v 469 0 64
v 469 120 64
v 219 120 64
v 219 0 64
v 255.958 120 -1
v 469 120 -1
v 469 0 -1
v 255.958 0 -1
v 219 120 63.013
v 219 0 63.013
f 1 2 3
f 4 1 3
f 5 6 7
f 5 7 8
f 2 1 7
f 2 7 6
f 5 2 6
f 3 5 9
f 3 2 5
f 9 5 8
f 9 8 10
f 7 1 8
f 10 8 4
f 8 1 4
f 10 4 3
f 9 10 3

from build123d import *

# Parameters (mm, degrees)
BOX016_W               = 250
BOX016_H               = 120
BOX016_DEPTH           = 65
BOX016_PLACEMENT_ANGLE = 60
BOX017_W               = 250
BOX017_H               = 120
BOX017_DEPTH           = 65
CUT009_PLACEMENT_ANGLE = 180


with BuildPart() as box016:
    # Box016 → Box016 (new body)
    with BuildSketch(Plane.XY):
        with Locations((125, 60)):
            Rectangle(BOX016_W, BOX016_H)
    extrude(amount=BOX016_DEPTH)


with BuildPart() as box016_1:
    # Box016 placement: moved
    add(box016.part.moved(Location((187.927513, 0, 108.5))).rotate(Axis((187.927513, 0, 108.5), (0, 1, 0)), BOX016_PLACEMENT_ANGLE))


with BuildPart() as cut009:
    # Box017 → Box017 (new body)
    with BuildSketch(Plane.XY):
        with Locations((125, 60)):
            Rectangle(BOX017_W, BOX017_H)
    extrude(amount=BOX017_DEPTH)

    # Cut009: cut Box016
    add(box016_1.part, mode=Mode.SUBTRACT)


with BuildPart() as cut009_1:
    # Cut009 placement: moved
    add(cut009.part.moved(Location((469, 0, 64))).rotate(Axis((469, 0, 64), (0, 1, 0)), CUT009_PLACEMENT_ANGLE))


solid = cut009_1.part
